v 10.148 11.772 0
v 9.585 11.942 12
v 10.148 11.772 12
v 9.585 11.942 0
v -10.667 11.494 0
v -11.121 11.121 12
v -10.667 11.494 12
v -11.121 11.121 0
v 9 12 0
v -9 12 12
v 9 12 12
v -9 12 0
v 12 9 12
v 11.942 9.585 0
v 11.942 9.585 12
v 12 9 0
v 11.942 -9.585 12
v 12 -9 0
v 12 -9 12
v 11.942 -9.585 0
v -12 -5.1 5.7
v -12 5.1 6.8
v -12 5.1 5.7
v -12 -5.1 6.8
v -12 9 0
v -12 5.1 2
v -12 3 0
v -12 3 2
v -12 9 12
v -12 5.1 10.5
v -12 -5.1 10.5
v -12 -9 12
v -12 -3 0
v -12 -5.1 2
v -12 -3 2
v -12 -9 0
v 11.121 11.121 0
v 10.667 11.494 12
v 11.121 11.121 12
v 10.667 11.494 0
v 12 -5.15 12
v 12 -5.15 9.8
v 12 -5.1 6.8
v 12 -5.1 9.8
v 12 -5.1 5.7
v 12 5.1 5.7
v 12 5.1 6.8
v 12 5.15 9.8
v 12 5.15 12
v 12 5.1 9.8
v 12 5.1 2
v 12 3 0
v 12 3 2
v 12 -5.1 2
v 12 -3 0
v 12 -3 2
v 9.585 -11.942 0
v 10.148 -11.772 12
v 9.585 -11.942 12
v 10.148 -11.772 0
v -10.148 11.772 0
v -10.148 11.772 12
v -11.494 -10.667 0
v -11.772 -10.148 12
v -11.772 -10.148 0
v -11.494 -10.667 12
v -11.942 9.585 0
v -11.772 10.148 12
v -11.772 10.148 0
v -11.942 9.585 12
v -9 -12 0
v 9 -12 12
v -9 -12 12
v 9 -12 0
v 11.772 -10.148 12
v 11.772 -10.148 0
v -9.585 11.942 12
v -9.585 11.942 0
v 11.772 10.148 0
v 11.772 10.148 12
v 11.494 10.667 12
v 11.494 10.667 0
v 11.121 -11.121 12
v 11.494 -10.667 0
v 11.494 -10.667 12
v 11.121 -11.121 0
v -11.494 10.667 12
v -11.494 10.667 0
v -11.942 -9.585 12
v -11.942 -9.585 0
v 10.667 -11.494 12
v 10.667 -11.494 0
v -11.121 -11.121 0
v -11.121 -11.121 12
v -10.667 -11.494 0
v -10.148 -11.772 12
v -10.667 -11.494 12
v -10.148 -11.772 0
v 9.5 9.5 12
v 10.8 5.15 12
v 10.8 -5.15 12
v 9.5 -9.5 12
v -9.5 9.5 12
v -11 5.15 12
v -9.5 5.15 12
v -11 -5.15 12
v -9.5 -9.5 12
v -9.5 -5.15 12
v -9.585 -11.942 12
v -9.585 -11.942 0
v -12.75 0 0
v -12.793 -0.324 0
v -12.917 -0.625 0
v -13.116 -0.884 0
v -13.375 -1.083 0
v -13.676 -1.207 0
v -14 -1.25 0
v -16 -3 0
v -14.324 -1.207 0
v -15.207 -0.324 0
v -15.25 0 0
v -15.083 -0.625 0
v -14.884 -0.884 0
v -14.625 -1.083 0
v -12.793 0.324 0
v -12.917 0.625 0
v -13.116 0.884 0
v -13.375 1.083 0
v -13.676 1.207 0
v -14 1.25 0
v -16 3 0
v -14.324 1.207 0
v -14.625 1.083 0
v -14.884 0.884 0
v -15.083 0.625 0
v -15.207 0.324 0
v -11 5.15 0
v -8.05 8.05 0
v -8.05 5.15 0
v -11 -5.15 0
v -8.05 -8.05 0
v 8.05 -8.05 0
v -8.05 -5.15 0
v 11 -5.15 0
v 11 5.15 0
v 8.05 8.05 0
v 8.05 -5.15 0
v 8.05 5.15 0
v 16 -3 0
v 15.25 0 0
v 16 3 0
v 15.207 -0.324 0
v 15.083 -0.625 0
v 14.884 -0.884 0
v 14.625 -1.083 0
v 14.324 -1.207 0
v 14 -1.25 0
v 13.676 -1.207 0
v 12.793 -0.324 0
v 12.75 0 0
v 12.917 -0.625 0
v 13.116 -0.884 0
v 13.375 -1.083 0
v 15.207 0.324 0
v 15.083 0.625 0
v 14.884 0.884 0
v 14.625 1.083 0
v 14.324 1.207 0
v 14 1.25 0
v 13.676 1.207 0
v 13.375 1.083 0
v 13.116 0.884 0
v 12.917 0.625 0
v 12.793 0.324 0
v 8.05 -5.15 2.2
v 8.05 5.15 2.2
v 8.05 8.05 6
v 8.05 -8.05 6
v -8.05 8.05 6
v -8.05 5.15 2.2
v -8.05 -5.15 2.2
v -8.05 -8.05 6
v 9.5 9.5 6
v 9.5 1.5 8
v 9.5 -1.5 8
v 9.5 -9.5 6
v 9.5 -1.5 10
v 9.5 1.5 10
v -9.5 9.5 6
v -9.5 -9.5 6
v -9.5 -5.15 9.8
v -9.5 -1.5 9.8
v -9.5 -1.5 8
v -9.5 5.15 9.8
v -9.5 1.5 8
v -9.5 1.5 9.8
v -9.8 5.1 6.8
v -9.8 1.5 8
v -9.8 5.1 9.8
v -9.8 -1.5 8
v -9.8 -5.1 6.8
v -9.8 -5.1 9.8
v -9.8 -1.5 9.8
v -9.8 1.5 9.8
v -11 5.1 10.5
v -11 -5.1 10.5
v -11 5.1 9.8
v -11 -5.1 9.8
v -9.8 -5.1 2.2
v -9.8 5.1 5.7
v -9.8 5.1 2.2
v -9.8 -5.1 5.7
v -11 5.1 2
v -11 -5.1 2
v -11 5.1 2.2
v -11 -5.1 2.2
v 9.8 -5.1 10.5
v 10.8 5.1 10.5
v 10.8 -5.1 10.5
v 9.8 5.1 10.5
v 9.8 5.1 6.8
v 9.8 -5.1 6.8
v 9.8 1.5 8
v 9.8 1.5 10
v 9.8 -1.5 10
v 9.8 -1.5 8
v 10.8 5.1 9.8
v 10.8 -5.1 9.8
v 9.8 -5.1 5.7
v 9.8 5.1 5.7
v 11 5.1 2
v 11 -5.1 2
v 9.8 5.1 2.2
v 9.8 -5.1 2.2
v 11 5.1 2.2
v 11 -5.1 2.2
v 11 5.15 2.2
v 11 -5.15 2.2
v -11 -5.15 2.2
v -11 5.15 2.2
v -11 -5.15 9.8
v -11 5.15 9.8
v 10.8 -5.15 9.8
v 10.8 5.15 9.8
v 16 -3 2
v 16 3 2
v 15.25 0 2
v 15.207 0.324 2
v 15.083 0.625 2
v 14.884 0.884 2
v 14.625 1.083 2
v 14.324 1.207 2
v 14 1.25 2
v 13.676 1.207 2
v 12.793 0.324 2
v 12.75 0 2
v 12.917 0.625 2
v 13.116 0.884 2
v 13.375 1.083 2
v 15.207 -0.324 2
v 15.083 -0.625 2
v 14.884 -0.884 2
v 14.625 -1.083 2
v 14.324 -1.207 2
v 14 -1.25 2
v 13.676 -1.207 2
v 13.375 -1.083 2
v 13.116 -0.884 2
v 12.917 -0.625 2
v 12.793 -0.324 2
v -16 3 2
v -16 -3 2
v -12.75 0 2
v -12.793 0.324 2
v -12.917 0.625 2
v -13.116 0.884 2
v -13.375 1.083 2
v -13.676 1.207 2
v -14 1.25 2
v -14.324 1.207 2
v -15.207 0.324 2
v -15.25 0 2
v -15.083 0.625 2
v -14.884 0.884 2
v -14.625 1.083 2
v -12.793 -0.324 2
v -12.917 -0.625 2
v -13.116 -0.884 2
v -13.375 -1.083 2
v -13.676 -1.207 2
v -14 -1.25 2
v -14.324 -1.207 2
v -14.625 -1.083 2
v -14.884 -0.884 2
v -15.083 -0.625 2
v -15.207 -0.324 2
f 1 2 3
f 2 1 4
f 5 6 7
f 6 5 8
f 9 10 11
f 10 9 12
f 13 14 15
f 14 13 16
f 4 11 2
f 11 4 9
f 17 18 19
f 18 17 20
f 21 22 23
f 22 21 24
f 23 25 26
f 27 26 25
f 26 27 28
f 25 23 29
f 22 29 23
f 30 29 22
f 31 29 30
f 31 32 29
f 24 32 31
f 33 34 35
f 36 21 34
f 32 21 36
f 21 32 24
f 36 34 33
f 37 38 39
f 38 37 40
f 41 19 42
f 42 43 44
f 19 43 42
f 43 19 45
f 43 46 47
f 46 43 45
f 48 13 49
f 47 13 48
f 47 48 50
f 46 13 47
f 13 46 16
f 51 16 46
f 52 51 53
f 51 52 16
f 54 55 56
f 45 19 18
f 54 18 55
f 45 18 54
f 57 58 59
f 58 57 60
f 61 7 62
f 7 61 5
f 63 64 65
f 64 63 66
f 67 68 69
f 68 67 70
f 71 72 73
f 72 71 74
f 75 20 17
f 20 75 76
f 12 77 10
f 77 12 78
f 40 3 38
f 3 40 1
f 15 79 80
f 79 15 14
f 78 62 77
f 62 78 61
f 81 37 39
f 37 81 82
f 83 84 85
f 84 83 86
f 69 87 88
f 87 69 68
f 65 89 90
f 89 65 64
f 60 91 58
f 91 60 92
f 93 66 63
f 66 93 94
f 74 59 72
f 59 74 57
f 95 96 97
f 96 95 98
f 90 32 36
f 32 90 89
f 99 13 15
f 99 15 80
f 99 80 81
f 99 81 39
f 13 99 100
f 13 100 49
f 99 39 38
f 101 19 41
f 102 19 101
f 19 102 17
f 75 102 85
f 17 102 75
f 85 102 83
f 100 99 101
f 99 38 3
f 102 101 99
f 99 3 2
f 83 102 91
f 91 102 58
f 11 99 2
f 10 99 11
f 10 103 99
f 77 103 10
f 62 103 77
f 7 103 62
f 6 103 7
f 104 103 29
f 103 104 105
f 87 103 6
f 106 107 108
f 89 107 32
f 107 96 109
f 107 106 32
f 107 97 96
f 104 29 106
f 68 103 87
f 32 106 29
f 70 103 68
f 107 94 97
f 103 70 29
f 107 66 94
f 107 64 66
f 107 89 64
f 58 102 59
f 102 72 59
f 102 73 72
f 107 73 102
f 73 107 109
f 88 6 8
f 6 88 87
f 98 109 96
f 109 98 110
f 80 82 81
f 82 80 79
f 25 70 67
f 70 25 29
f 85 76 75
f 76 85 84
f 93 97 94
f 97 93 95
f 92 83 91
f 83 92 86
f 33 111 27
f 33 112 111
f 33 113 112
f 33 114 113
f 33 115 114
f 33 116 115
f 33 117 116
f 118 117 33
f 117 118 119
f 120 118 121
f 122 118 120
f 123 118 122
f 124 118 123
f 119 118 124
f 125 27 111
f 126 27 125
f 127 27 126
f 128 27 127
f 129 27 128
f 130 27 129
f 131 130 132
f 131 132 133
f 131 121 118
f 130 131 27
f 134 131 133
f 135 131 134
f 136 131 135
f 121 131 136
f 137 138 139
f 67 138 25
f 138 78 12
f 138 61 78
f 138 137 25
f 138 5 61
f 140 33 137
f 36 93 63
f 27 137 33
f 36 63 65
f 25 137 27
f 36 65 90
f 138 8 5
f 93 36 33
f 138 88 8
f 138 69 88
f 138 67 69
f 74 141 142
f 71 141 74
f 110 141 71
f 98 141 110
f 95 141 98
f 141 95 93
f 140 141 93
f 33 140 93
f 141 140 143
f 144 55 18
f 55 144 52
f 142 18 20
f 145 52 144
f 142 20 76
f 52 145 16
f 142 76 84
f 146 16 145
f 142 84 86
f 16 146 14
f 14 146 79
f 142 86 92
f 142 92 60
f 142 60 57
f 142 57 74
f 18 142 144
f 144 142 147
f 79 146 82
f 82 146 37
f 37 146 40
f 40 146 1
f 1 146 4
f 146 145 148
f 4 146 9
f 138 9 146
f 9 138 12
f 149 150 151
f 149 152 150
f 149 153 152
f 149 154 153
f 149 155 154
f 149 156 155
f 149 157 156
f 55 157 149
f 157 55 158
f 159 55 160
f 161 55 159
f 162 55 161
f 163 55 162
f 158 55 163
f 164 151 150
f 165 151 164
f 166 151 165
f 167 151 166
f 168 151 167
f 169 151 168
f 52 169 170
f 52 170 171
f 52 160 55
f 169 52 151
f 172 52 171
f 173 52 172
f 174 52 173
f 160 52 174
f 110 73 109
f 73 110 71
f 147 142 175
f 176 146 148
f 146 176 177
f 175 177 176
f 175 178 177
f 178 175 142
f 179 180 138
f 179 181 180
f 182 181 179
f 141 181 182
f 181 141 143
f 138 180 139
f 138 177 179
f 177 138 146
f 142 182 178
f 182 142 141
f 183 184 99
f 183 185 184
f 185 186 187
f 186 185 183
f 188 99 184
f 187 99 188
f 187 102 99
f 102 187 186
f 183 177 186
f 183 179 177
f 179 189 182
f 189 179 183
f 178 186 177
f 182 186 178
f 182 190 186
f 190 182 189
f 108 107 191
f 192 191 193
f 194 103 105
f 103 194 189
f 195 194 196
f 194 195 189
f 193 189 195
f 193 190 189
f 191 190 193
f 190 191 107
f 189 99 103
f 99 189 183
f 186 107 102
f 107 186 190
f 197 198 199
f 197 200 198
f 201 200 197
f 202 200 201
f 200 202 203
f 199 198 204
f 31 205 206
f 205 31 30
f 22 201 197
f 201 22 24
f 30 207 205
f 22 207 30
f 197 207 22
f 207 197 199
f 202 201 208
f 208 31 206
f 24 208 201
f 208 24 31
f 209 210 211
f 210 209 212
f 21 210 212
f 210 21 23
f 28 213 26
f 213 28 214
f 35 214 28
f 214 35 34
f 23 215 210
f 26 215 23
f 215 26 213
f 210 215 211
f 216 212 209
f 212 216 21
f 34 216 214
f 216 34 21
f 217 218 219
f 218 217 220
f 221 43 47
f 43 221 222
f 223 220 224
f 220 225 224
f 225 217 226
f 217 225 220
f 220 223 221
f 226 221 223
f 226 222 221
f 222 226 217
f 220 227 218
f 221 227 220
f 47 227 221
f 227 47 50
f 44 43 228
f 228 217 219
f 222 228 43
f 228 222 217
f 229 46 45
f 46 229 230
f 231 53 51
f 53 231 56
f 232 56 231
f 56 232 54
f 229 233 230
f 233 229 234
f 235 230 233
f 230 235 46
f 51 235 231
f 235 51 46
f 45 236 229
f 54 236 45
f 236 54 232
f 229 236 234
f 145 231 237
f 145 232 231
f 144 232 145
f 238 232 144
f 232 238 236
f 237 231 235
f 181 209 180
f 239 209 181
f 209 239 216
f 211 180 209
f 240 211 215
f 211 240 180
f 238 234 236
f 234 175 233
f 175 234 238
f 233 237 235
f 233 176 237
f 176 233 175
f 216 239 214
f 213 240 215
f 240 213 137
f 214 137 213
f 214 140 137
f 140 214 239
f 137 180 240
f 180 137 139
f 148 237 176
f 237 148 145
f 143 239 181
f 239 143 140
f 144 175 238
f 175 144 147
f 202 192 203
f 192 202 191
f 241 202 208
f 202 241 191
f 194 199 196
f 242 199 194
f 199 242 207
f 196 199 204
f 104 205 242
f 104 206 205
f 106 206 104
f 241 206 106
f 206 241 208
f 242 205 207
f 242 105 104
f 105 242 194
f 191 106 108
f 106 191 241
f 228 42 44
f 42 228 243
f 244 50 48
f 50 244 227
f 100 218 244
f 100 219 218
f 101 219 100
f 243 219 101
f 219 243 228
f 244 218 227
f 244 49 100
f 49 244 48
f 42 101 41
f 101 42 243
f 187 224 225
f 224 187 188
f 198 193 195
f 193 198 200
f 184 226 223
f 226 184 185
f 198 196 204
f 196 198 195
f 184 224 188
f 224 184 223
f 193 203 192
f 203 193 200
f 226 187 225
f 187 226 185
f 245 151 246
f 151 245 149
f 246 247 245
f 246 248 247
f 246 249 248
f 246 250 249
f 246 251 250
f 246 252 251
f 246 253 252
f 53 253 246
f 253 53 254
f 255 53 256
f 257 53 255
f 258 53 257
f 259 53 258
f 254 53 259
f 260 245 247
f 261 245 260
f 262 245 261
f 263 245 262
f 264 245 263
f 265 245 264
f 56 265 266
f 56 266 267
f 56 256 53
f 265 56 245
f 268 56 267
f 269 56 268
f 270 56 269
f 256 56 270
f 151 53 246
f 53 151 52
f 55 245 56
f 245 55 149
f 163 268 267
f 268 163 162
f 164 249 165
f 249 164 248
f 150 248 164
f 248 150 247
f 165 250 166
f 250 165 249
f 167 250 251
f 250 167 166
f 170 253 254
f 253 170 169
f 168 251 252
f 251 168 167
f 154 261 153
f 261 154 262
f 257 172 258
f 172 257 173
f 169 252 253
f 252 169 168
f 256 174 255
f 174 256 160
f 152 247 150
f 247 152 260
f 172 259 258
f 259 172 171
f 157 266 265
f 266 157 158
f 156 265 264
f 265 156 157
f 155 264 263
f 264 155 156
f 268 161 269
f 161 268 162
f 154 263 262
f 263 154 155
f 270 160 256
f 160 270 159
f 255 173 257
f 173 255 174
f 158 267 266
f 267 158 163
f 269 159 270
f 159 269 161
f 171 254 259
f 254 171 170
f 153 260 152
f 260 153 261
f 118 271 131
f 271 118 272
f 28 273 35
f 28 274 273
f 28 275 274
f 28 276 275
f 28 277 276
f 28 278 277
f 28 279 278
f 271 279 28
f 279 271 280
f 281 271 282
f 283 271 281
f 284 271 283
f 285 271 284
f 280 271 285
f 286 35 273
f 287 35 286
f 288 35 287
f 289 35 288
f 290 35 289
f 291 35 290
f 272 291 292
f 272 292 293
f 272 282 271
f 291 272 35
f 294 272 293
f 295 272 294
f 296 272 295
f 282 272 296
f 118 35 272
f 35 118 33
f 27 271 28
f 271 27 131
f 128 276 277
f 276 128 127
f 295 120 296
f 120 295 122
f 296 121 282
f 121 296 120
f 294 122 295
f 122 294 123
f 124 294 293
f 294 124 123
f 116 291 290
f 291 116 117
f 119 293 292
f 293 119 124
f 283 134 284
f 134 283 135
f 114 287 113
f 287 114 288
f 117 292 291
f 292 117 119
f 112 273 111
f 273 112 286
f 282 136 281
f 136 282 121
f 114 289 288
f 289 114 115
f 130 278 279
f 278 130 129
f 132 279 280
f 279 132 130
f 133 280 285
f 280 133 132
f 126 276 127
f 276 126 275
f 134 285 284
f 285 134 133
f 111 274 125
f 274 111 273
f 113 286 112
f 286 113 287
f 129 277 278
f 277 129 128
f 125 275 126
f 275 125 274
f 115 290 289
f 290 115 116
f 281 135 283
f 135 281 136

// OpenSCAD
// Voice Coil Actuator - 3D Printable Parts
// For Guitar Hero Bot Project
// 
// Designed to fit around Cherry MX compatible keyboard switches
// 
// Usage:
//   1. Open in OpenSCAD
//   2. Enable Customizer: View → Customizer (or View → Hide Customizer to toggle)
//   3. Select part from dropdown in "Part Selection" section
//   4. Render (F6) and Export as STL (File → Export → Export as STL)
//
// Alternative (without Customizer):
//   - Scroll to bottom of file
//   - Change PART = "assembly" to PART = "bobbin" (or housing, wire_guide, print_plate)
//
// Command line export:
//   openscad -o bobbin.stl -D 'PART="bobbin"' voice-coil-parts.scad
//   openscad -o housing.stl -D 'PART="housing"' voice-coil-parts.scad
//   openscad -o wire_guide.stl -D 'PART="wire_guide"' voice-coil-parts.scad
//
// Print settings:
//   - Layer height: 0.15-0.2mm
//   - Infill: 30-50%
//   - Material: PLA or PETG
//   - Supports: Yes for housing (magnet pockets)

// ============================================================
// CONFIGURATION PARAMETERS
// ============================================================

// Switch dimensions (Cherry MX compatible)
switch_width = 15.6;        // Switch body width
switch_depth = 15.6;        // Switch body depth  
stem_diameter = 4.0;        // MX stem cross diameter
stem_socket_dia = 4.3;      // Socket with clearance

// Magnet dimensions (N42 10x5x3mm blocks)
magnet_length = 10.0;
magnet_width = 5.0;
magnet_height = 3.0;
magnet_clearance = 0.2;     // Extra space for fit

// Steel yoke dimensions
yoke_thickness = 2.0;
yoke_width = 10.0;

// Coil dimensions
coil_wire_dia = 0.29;       // 30 AWG with enamel
coil_turns = 60;
coil_layers = 2;
coil_width = 3.0;           // Fits in magnet gap
coil_height = coil_layers * coil_wire_dia * (coil_turns/coil_layers/30);

// Air gap
air_gap = 3.5;              // Space between magnets

// General tolerances
print_tolerance = 0.2;      // General clearance for 3D printing
tight_tolerance = 0.1;      // For press fits

// Derived dimensions
housing_inner = switch_width + 2 * print_tolerance;
housing_wall = 2.0;
housing_outer = housing_inner + 2 * (magnet_width + housing_wall + air_gap/2);

// ============================================================
// HELPER MODULES
// ============================================================

// Rounded rectangle
module rounded_rect(w, d, h, r) {
    hull() {
        translate([r, r, 0]) cylinder(r=r, h=h, $fn=32);
        translate([w-r, r, 0]) cylinder(r=r, h=h, $fn=32);
        translate([r, d-r, 0]) cylinder(r=r, h=h, $fn=32);
        translate([w-r, d-r, 0]) cylinder(r=r, h=h, $fn=32);
    }
}

// Cherry MX stem cross shape (for socket)
module mx_stem_cross(height, clearance=0) {
    stem_long = 4.0 + clearance;
    stem_short = 1.2 + clearance;
    
    union() {
        // Vertical bar
        translate([-stem_short/2, -stem_long/2, 0])
            cube([stem_short, stem_long, height]);
        // Horizontal bar
        translate([-stem_long/2, -stem_short/2, 0])
            cube([stem_long, stem_short, height]);
    }
}

// ============================================================
// BOBBIN (Moving Part)
// ============================================================
// 
// The bobbin holds the voice coil and attaches to the switch stem.
// It moves up and down within the magnetic gap.
//
//              ┌─────────────────┐
//              │   Top surface   │
//              │  ┌───────────┐  │
//              │  │ Stem      │  │
//              │  │ socket    │  │
//              │  │    +      │  │
//              │  └───────────┘  │
//              │  ┌───────────┐  │
//              │  │░░░░░░░░░░░│  │ ← Coil groove
//              │  │░░░░░░░░░░░│  │
//              │  └───────────┘  │
//              └─────────────────┘

module bobbin() {
    bobbin_outer = 18;          // Outer dimension
    bobbin_inner = 10;          // Inner opening (clears switch top)
    bobbin_height = 8;          // Total height
    coil_groove_depth = 2.5;    // Depth of groove for wire
    coil_groove_width = coil_width + 0.5;  // Width with clearance
    stem_socket_depth = 4.5;    // How deep stem inserts
    wall = (bobbin_outer - bobbin_inner) / 2;
    
    difference() {
        // Main body
        translate([-bobbin_outer/2, -bobbin_outer/2, 0])
            rounded_rect(bobbin_outer, bobbin_outer, bobbin_height, 2);
        
        // Inner opening (switch clearance)
        translate([-bobbin_inner/2, -bobbin_inner/2, -1])
            cube([bobbin_inner, bobbin_inner, bobbin_height + 2]);
        
        // Coil groove (rectangular channel around perimeter)
        coil_groove_inner = bobbin_inner + 0.5;
        coil_groove_outer = bobbin_outer - 1.0;
        
        difference() {
            translate([-(coil_groove_outer)/2, -(coil_groove_outer)/2, bobbin_height - coil_groove_depth])
                cube([coil_groove_outer, coil_groove_outer, coil_groove_depth + 1]);
            
            translate([-(coil_groove_inner)/2, -(coil_groove_inner)/2, bobbin_height - coil_groove_depth - 1])
                cube([coil_groove_inner, coil_groove_inner, coil_groove_depth + 3]);
        }
        
        // Stem socket (MX cross shape)
        translate([0, 0, -1])
            mx_stem_cross(stem_socket_depth + 1, 0.3);
        
        // Wire exit slots (two opposite sides)
        wire_slot_width = 2;
        wire_slot_depth = 3;
        translate([-bobbin_outer/2 - 1, -wire_slot_width/2, bobbin_height - wire_slot_depth])
            cube([wall + 2, wire_slot_width, wire_slot_depth + 1]);
        translate([bobbin_outer/2 - wall - 1, -wire_slot_width/2, bobbin_height - wire_slot_depth])
            cube([wall + 2, wire_slot_width, wire_slot_depth + 1]);
    }
    
    // Add stem alignment guides
    guide_height = 2;
    guide_width = 1.5;
    for (angle = [0, 90, 180, 270]) {
        rotate([0, 0, angle])
            translate([stem_socket_dia/2 + 0.5, -guide_width/2, 0])
                cube([1, guide_width, guide_height]);
    }
}

// ============================================================
// HOUSING (Fixed Part)
// ============================================================
//
// The housing holds the magnets and steel yokes, and mounts
// around the keyboard switch.
//
//    ┌─────────────────────────────┐
//    │ ┌───┐               ┌───┐   │
//    │ │Mag│    ┌─────┐    │Mag│   │ ← Magnet pockets
//    │ │   │    │     │    │   │   │
//    │ └───┘    │     │    └───┘   │
//    │          │Swtch│            │ ← Switch opening
//    │ ┌───┐    │     │    ┌───┐   │
//    │ │Mag│    │     │    │Mag│   │
//    │ │   │    └─────┘    │   │   │
//    │ └───┘               └───┘   │
//    │ ════════════════════════    │ ← Yoke slot
//    └─────────────────────────────┘

module housing() {
    housing_width = 24;
    housing_depth = 24;
    housing_height = 12;
    
    switch_opening = switch_width + 0.5;  // Clearance around switch
    
    // Magnet pocket dimensions (with clearance)
    mag_pocket_l = magnet_length + magnet_clearance;
    mag_pocket_w = magnet_width + magnet_clearance;
    mag_pocket_h = magnet_height + magnet_clearance;
    
    // Yoke slot dimensions
    yoke_slot_w = housing_width - 2;
    yoke_slot_d = yoke_width + 0.3;
    yoke_slot_h = yoke_thickness + 0.2;
    
    // Gap position (where coil moves)
    gap_width = air_gap;
    
    difference() {
        // Main body
        translate([-housing_width/2, -housing_depth/2, 0])
            rounded_rect(housing_width, housing_depth, housing_height, 3);
        
        // Switch opening (through hole)
        translate([-switch_opening/2, -switch_opening/2, -1])
            cube([switch_opening, switch_opening, housing_height + 2]);
        
        // Bobbin travel channel (wider than switch opening, for coil clearance)
        bobbin_channel = 19;  // Slightly larger than bobbin
        translate([-bobbin_channel/2, -bobbin_channel/2, housing_height - 6])
            cube([bobbin_channel, bobbin_channel, 7]);
        
        // Magnet pockets (4 magnets, 2 on each side of gap)
        // Left side magnets
        translate([-(switch_opening/2 + gap_width/2 + mag_pocket_w), -mag_pocket_l/2, housing_height - mag_pocket_h - 2])
            cube([mag_pocket_w, mag_pocket_l, mag_pocket_h + 0.5]);
        
        translate([-(switch_opening/2 + gap_width/2 + mag_pocket_w), -mag_pocket_l/2, 2])
            cube([mag_pocket_w, mag_pocket_l, mag_pocket_h + 0.5]);
        
        // Right side magnets
        translate([(switch_opening/2 + gap_width/2), -mag_pocket_l/2, housing_height - mag_pocket_h - 2])
            cube([mag_pocket_w, mag_pocket_l, mag_pocket_h + 0.5]);
            
        translate([(switch_opening/2 + gap_width/2), -mag_pocket_l/2, 2])
            cube([mag_pocket_w, mag_pocket_l, mag_pocket_h + 0.5]);
        
        // Bottom yoke slot
        translate([-yoke_slot_w/2, -yoke_slot_d/2, -0.1])
            cube([yoke_slot_w, yoke_slot_d, yoke_slot_h + 0.1]);
        
        // Top yoke slots (two pieces, on each side)
        translate([-(housing_width/2 - 1), -yoke_slot_d/2, housing_height - yoke_slot_h])
            cube([(housing_width - switch_opening)/2 - gap_width/2, yoke_slot_d, yoke_slot_h + 0.1]);
            
        translate([switch_opening/2 + gap_width/2 + 1, -yoke_slot_d/2, housing_height - yoke_slot_h])
            cube([(housing_width - switch_opening)/2 - gap_width/2, yoke_slot_d, yoke_slot_h + 0.1]);
        
        // Wire channel (groove for coil wires to exit)
        wire_channel_w = 3;
        wire_channel_h = 2;
        translate([-housing_width/2 - 1, -wire_channel_w/2, housing_height - 4])
            cube([housing_width + 2, wire_channel_w, wire_channel_h]);
    }
    
    // Add mounting tabs with screw holes
    tab_width = 6;
    tab_length = 4;
    tab_height = 2;
    screw_hole_dia = 2.5;  // For M2.5 screws
    
    for (angle = [0, 180]) {
        rotate([0, 0, angle])
            translate([housing_width/2, -tab_width/2, 0]) {
                difference() {
                    cube([tab_length, tab_width, tab_height]);
                    translate([tab_length/2, tab_width/2, -1])
                        cylinder(d=screw_hole_dia, h=tab_height + 2, $fn=24);
                }
            }
    }
}

// ============================================================
// WIRE GUIDE / STRAIN RELIEF
// ============================================================

module wire_guide() {
    guide_width = 8;
    guide_depth = 5;
    guide_height = 4;
    wire_hole_dia = 1.5;
    
    difference() {
        // Body
        translate([-guide_width/2, 0, 0])
            cube([guide_width, guide_depth, guide_height]);
        
        // Wire holes
        translate([-2, -1, guide_height/2])
            rotate([-90, 0, 0])
                cylinder(d=wire_hole_dia, h=guide_depth + 2, $fn=16);
        
        translate([2, -1, guide_height/2])
            rotate([-90, 0, 0])
                cylinder(d=wire_hole_dia, h=guide_depth + 2, $fn=16);
        
        // Clip slot (to attach to housing)
        translate([-guide_width/2 - 1, guide_depth - 1.5, -1])
            cube([guide_width + 2, 1.5, 2.5]);
    }
}

// ============================================================
// ASSEMBLY VISUALIZATION
// ============================================================

module assembly() {
    // Housing (transparent for visualization)
    color("gray", 0.5)
        housing();
    
    // Bobbin (in up position)
    color("blue", 0.8)
        translate([0, 0, 8])
            bobbin();
    
    // Magnets (red = north up, blue = south up for visualization)
    // Left side
    color("red")
        translate([-(switch_width/2 + air_gap/2 + magnet_width/2), 0, 12 - magnet_height - 2])
            translate([-magnet_width/2, -magnet_length/2, 0])
                cube([magnet_width, magnet_length, magnet_height]);
    
    color("blue")
        translate([-(switch_width/2 + air_gap/2 + magnet_width/2), 0, 2])
            translate([-magnet_width/2, -magnet_length/2, 0])
                cube([magnet_width, magnet_length, magnet_height]);
    
    // Right side
    color("red")
        translate([(switch_width/2 + air_gap/2 + magnet_width/2), 0, 12 - magnet_height - 2])
            translate([-magnet_width/2, -magnet_length/2, 0])
                cube([magnet_width, magnet_length, magnet_height]);
                
    color("blue")
        translate([(switch_width/2 + air_gap/2 + magnet_width/2), 0, 2])
            translate([-magnet_width/2, -magnet_length/2, 0])
                cube([magnet_width, magnet_length, magnet_height]);
    
    // Steel yokes
    color("silver")
        translate([-11, -yoke_width/2, 0])
            cube([22, yoke_width, yoke_thickness]);
    
    // Wire guide
    color("green")
        translate([0, -15, 8])
            wire_guide();
}

// ============================================================
// RENDER SELECTION
// ============================================================
// 
// Change PART to select what to render:
//   "assembly"    - All parts together (visualization only)
//   "bobbin"      - Moving part with coil groove
//   "housing"     - Fixed part with magnet pockets
//   "wire_guide"  - Strain relief clip
//   "print_plate" - All printable parts arranged for printing
//
// In OpenSCAD: Use the Customizer panel (View → Customizer)
// Or change the value below directly:

/* [Part Selection] */
PART = "housing"; // ["assembly", "bobbin", "housing", "wire_guide", "print_plate"]

// Render the selected part
if (PART == "assembly") {
    assembly();
} else if (PART == "bobbin") {
    bobbin();
} else if (PART == "housing") {
    housing();
} else if (PART == "wire_guide") {
    wire_guide();
} else if (PART == "print_plate") {
    // All printable parts laid out for printing
    translate([-20, 0, 0]) bobbin();
    translate([20, 0, 0]) housing();
    translate([0, 25, 0]) wire_guide();
}
